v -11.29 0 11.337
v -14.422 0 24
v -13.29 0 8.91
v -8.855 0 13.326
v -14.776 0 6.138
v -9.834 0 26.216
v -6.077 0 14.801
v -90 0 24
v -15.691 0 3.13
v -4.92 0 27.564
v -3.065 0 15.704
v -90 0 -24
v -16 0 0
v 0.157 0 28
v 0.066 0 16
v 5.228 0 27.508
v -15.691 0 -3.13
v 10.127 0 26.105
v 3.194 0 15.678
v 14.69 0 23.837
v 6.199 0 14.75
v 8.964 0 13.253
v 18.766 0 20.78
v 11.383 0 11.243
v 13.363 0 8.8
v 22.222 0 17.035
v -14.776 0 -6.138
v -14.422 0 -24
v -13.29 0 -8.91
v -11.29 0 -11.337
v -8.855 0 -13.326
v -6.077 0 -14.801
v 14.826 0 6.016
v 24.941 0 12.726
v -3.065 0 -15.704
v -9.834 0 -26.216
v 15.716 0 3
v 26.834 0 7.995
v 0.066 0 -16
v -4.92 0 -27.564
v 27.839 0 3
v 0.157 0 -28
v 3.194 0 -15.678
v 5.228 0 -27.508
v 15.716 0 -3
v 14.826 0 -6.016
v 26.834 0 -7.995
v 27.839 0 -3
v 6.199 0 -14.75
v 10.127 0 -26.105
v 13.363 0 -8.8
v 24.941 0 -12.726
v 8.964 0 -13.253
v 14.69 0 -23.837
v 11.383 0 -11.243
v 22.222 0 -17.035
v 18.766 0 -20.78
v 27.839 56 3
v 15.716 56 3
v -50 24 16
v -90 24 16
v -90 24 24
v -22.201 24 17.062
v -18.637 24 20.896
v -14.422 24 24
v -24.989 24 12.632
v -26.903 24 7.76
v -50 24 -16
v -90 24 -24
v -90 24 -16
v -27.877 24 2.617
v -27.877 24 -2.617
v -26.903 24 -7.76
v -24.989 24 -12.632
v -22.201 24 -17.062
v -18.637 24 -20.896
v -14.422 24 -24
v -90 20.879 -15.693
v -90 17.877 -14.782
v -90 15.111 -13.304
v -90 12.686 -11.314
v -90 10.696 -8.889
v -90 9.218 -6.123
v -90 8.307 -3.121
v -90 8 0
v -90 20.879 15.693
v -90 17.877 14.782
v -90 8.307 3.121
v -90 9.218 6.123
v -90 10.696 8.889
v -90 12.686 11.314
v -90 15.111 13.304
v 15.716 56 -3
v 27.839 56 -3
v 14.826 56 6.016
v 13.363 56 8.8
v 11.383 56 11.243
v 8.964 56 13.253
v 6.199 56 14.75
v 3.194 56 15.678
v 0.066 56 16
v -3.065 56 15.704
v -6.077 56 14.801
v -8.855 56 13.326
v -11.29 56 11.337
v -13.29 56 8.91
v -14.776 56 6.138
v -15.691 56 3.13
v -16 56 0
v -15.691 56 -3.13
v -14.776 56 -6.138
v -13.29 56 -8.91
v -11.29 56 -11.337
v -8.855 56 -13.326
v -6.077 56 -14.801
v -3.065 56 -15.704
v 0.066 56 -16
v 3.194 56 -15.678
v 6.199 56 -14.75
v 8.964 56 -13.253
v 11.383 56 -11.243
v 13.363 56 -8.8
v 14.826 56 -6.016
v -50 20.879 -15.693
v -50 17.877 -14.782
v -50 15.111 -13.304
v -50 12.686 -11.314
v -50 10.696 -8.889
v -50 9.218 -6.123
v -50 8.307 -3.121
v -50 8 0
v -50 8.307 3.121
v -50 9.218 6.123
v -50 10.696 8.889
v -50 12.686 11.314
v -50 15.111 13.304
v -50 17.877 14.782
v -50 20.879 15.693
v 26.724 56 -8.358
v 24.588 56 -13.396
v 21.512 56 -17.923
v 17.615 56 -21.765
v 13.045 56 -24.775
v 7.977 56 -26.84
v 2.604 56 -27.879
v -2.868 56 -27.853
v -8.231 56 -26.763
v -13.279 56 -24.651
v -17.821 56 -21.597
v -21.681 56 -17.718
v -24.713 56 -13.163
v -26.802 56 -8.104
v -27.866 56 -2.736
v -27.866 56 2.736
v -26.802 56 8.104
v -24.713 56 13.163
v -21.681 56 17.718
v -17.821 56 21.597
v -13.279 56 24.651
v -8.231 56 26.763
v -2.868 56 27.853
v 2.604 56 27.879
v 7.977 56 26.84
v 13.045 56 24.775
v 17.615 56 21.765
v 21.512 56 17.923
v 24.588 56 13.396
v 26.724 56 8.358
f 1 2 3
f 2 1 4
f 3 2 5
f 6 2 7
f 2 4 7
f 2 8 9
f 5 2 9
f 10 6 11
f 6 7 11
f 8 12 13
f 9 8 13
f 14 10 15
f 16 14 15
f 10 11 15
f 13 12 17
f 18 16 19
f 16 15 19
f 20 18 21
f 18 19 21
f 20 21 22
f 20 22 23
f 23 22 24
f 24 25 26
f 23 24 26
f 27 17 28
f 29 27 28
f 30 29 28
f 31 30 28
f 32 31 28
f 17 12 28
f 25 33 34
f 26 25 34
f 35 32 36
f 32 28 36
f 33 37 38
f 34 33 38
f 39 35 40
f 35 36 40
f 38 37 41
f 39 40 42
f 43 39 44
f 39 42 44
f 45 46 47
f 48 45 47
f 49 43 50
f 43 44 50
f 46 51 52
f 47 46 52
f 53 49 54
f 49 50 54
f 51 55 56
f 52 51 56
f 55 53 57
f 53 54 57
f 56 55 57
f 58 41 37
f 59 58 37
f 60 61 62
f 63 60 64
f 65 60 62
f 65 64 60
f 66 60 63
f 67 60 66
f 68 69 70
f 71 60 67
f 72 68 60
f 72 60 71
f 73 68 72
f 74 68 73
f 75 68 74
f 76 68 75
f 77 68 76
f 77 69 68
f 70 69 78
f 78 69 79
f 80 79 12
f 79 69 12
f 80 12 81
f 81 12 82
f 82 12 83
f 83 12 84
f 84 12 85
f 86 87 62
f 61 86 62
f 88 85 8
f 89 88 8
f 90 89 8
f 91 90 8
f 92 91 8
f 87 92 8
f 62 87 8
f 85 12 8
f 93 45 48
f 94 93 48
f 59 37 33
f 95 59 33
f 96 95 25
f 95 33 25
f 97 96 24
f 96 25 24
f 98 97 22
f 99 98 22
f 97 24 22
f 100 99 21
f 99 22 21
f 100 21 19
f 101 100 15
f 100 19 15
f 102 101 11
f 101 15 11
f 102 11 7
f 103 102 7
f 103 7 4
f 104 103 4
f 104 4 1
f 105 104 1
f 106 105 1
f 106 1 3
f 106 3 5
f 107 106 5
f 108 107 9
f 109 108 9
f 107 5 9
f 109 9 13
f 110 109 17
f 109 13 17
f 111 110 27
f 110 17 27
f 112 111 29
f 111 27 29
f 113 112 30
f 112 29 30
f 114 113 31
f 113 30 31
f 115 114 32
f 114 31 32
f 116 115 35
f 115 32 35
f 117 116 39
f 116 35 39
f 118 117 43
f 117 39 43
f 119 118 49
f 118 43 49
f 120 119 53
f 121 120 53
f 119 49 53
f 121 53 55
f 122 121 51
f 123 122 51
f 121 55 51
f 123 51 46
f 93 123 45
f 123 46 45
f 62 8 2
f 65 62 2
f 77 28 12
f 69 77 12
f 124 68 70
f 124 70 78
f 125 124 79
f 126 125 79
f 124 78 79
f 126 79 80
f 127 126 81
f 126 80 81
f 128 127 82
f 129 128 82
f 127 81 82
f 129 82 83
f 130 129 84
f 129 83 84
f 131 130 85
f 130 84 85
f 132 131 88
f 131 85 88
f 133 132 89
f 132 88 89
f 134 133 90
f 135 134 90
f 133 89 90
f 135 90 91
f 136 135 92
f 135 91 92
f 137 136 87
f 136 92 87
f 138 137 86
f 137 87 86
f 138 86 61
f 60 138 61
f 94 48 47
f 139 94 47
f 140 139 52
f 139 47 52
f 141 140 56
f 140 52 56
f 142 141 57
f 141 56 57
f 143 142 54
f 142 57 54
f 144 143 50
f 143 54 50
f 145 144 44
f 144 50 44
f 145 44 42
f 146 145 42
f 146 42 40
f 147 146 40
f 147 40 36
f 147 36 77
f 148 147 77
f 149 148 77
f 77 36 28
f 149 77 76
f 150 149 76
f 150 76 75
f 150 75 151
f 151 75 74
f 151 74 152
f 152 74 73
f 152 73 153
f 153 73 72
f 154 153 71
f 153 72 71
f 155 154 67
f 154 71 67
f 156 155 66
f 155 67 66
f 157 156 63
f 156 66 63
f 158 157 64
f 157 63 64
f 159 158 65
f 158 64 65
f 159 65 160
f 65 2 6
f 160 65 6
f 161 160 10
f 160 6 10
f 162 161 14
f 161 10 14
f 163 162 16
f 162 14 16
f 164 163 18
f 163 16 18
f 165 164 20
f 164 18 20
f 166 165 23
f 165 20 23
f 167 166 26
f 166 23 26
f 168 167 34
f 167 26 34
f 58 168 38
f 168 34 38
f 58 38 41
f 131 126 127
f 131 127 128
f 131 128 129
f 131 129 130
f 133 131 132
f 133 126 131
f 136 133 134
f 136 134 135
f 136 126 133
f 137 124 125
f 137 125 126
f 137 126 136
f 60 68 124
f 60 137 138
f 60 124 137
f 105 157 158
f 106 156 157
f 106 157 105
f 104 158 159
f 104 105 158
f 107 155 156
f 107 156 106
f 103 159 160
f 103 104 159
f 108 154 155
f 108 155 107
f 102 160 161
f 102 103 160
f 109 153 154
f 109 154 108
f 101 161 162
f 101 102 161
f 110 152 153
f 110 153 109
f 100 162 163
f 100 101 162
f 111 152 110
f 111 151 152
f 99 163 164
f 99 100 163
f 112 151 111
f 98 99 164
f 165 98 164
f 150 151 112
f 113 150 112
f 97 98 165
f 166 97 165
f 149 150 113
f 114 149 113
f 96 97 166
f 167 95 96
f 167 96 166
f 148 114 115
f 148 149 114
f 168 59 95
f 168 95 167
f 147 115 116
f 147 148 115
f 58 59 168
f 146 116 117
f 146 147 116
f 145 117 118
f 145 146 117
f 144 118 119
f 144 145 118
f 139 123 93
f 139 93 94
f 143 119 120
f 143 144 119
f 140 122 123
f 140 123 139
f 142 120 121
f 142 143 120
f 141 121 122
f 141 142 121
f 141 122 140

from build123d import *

# Parameters (mm, degrees)
BOSS_EXTRUDE4_DEPTH = 56
BOSS_EXTRUDE5_DEPTH = 24
SKETCH7_R           = 16
CUT_EXTRUDE1_DEPTH  = 40


with BuildPart() as part:
    # Sketch5 → Boss-Extrude4 (new body)
    with BuildSketch(Plane(origin=(0, 0, 0), x_dir=(1, 0, 0), z_dir=(0, 1, 0))):
        with BuildLine():
            Line((27.838821814, -3), (15.716233646, -3))
            ThreePointArc((15.716233646, -3), (-16, 0), (15.716233646, 3))
            Line((15.716233646, 3), (27.838821814, 3))
            ThreePointArc((27.838821814, 3), (-28, 0), (27.838821814, -3))
        make_face()
    extrude(amount=BOSS_EXTRUDE4_DEPTH)

    # Sketch6 → Boss-Extrude5 (add)
    with BuildSketch(Plane(origin=(0, 0, 0), x_dir=(1, 0, 0), z_dir=(0, 1, 0))):
        with BuildLine():
            Line((-90, 24), (-90, -24))
            Line((-90, -24), (-14.422205102, -24))
            ThreePointArc((-14.422205102, -24), (-28, 0), (-14.422205102, 24))
            Line((-14.422205102, 24), (-90, 24))
        make_face()
    extrude(amount=BOSS_EXTRUDE5_DEPTH)

    # Sketch7 → Cut-Extrude1 (cut)
    with BuildSketch(Plane.ZY.offset(90)):
        with Locations((0, 24)):
            Circle(SKETCH7_R)
    extrude(amount=-CUT_EXTRUDE1_DEPTH, mode=Mode.SUBTRACT)


solid = part.part
